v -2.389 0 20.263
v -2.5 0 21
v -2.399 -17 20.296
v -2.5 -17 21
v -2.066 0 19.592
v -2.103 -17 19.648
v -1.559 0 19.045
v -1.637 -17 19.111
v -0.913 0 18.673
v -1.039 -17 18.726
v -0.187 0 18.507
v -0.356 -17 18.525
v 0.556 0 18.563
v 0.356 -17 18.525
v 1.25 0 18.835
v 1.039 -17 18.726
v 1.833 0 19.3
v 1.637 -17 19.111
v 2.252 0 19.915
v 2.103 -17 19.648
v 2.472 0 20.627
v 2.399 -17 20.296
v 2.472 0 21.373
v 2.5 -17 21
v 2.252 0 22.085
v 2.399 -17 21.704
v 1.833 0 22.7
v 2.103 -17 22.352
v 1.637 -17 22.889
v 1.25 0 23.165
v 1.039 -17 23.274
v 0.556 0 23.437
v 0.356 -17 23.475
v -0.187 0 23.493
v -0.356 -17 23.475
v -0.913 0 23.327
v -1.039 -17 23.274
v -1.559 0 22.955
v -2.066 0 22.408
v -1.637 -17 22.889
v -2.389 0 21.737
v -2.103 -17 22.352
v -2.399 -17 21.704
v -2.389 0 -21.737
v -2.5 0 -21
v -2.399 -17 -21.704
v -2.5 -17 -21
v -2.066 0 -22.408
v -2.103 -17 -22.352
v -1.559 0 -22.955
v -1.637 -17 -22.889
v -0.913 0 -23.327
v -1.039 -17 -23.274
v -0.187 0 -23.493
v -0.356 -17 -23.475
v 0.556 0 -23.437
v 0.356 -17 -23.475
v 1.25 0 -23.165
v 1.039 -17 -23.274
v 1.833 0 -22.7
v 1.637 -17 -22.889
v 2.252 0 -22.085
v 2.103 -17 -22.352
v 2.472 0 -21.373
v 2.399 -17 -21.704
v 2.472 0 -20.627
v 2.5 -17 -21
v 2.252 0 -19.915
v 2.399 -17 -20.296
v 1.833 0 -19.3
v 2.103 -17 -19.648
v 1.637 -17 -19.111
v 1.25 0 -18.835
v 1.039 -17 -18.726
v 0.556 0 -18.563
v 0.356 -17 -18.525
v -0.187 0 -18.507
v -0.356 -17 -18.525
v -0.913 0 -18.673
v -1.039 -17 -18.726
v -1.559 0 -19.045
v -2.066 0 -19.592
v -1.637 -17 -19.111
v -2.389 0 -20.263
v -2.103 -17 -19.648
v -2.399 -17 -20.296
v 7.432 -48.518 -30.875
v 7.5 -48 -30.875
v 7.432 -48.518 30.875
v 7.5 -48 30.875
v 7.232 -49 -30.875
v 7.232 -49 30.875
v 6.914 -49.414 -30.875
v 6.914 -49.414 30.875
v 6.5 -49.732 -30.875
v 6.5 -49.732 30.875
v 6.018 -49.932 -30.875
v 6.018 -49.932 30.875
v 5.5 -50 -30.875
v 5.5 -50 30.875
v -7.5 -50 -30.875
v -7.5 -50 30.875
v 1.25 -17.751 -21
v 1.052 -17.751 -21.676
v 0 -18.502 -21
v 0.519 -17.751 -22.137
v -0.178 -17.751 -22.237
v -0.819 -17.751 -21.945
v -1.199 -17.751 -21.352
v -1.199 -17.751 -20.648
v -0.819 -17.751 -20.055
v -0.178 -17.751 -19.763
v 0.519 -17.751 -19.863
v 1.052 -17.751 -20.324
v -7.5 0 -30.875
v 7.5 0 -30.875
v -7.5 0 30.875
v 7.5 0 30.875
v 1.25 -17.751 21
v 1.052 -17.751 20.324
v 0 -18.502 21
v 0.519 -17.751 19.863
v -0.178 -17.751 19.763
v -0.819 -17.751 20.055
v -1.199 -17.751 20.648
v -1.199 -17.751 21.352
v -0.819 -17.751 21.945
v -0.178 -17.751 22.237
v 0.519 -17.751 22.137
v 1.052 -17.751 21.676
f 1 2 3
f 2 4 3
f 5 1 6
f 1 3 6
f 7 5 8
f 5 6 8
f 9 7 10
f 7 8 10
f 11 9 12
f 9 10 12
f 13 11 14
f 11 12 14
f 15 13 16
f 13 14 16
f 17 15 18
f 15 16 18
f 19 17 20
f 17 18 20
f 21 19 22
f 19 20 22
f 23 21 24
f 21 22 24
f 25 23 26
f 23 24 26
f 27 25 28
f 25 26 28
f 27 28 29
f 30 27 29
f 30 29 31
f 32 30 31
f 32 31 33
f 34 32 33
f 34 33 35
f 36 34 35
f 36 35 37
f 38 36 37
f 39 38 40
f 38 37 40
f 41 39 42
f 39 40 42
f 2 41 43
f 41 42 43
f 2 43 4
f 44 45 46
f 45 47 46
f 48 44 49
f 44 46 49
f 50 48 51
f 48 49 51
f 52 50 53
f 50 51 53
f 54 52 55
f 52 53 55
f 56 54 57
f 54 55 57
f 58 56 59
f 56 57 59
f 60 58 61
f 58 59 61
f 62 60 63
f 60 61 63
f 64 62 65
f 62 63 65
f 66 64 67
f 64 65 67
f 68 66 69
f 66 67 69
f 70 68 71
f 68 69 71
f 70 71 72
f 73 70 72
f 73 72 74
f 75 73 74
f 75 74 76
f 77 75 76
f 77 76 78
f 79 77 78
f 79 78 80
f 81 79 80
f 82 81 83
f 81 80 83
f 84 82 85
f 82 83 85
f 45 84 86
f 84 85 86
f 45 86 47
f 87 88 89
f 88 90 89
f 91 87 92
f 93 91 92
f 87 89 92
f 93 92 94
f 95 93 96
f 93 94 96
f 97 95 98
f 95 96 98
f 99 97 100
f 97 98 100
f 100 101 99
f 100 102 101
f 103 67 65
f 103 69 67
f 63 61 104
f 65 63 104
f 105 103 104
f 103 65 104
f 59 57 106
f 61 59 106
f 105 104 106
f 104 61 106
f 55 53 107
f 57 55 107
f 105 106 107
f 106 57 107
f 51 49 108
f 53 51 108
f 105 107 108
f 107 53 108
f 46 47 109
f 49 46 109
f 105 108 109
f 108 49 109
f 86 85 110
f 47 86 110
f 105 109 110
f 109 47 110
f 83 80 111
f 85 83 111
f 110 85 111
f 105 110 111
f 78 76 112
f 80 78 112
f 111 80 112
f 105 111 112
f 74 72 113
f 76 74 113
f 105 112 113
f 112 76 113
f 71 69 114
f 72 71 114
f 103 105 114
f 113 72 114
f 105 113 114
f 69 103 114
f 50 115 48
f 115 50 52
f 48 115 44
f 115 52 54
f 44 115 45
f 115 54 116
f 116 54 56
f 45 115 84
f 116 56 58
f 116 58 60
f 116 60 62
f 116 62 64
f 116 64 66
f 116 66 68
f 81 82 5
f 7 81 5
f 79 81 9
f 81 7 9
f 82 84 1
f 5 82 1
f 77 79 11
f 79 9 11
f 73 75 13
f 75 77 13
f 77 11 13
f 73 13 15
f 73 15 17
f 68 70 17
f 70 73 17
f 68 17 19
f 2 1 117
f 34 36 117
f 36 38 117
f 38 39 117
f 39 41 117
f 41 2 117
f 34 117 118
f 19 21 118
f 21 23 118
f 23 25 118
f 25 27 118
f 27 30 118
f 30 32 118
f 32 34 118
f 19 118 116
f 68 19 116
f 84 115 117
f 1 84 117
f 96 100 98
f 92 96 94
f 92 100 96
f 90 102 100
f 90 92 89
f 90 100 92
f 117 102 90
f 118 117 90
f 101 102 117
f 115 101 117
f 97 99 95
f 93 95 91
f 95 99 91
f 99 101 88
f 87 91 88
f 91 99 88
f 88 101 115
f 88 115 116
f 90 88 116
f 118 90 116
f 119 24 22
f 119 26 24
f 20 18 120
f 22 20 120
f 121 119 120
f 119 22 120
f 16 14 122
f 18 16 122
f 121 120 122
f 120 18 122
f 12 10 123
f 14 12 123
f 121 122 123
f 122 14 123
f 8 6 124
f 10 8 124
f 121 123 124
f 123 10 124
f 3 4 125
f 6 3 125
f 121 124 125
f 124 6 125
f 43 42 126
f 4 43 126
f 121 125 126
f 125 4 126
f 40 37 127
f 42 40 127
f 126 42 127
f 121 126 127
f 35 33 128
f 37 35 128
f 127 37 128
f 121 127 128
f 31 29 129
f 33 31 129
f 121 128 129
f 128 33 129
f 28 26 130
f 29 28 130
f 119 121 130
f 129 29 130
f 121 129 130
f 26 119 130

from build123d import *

# Parameters (mm, degrees)
SKETCH1_W             = 15
SKETCH1_H             = 50
BOSS_EXTRUDE1_DEPTH   = 30.875
FILLET1_R             = 2
M6_TAPPED_HOLE1_D     = 5
M6_TAPPED_HOLE1_DEPTH = 17
M6_TAPPED_HOLE1_TIP   = 1.502151548


with BuildPart() as part:
    # Sketch1 → Boss-Extrude1 (new, symmetric)
    with BuildSketch(Plane.XY):
        with Locations((0, -25)):
            Rectangle(SKETCH1_W, SKETCH1_H)
    extrude(amount=BOSS_EXTRUDE1_DEPTH, both=True)

    # Fillet1
    fillet1_edges = [part.edges().sort_by_distance(p)[0] for p in [
        (7.5, -50, 0),
    ]]
    fillet(fillet1_edges, radius=FILLET1_R)

    # M6 Tapped Hole1
    with Locations(Plane(origin=(0, 0, 0), x_dir=(1, 0, 0), z_dir=(0, 1, 0))):
        with Locations((0, 21), (0, -21)):
            Hole(M6_TAPPED_HOLE1_D / 2, depth=M6_TAPPED_HOLE1_DEPTH)
            with Locations((0, 0, -(M6_TAPPED_HOLE1_DEPTH + M6_TAPPED_HOLE1_TIP / 2))):  # 118° drill point
                Cone(0, M6_TAPPED_HOLE1_D / 2, M6_TAPPED_HOLE1_TIP, mode=Mode.SUBTRACT)


solid = part.part
